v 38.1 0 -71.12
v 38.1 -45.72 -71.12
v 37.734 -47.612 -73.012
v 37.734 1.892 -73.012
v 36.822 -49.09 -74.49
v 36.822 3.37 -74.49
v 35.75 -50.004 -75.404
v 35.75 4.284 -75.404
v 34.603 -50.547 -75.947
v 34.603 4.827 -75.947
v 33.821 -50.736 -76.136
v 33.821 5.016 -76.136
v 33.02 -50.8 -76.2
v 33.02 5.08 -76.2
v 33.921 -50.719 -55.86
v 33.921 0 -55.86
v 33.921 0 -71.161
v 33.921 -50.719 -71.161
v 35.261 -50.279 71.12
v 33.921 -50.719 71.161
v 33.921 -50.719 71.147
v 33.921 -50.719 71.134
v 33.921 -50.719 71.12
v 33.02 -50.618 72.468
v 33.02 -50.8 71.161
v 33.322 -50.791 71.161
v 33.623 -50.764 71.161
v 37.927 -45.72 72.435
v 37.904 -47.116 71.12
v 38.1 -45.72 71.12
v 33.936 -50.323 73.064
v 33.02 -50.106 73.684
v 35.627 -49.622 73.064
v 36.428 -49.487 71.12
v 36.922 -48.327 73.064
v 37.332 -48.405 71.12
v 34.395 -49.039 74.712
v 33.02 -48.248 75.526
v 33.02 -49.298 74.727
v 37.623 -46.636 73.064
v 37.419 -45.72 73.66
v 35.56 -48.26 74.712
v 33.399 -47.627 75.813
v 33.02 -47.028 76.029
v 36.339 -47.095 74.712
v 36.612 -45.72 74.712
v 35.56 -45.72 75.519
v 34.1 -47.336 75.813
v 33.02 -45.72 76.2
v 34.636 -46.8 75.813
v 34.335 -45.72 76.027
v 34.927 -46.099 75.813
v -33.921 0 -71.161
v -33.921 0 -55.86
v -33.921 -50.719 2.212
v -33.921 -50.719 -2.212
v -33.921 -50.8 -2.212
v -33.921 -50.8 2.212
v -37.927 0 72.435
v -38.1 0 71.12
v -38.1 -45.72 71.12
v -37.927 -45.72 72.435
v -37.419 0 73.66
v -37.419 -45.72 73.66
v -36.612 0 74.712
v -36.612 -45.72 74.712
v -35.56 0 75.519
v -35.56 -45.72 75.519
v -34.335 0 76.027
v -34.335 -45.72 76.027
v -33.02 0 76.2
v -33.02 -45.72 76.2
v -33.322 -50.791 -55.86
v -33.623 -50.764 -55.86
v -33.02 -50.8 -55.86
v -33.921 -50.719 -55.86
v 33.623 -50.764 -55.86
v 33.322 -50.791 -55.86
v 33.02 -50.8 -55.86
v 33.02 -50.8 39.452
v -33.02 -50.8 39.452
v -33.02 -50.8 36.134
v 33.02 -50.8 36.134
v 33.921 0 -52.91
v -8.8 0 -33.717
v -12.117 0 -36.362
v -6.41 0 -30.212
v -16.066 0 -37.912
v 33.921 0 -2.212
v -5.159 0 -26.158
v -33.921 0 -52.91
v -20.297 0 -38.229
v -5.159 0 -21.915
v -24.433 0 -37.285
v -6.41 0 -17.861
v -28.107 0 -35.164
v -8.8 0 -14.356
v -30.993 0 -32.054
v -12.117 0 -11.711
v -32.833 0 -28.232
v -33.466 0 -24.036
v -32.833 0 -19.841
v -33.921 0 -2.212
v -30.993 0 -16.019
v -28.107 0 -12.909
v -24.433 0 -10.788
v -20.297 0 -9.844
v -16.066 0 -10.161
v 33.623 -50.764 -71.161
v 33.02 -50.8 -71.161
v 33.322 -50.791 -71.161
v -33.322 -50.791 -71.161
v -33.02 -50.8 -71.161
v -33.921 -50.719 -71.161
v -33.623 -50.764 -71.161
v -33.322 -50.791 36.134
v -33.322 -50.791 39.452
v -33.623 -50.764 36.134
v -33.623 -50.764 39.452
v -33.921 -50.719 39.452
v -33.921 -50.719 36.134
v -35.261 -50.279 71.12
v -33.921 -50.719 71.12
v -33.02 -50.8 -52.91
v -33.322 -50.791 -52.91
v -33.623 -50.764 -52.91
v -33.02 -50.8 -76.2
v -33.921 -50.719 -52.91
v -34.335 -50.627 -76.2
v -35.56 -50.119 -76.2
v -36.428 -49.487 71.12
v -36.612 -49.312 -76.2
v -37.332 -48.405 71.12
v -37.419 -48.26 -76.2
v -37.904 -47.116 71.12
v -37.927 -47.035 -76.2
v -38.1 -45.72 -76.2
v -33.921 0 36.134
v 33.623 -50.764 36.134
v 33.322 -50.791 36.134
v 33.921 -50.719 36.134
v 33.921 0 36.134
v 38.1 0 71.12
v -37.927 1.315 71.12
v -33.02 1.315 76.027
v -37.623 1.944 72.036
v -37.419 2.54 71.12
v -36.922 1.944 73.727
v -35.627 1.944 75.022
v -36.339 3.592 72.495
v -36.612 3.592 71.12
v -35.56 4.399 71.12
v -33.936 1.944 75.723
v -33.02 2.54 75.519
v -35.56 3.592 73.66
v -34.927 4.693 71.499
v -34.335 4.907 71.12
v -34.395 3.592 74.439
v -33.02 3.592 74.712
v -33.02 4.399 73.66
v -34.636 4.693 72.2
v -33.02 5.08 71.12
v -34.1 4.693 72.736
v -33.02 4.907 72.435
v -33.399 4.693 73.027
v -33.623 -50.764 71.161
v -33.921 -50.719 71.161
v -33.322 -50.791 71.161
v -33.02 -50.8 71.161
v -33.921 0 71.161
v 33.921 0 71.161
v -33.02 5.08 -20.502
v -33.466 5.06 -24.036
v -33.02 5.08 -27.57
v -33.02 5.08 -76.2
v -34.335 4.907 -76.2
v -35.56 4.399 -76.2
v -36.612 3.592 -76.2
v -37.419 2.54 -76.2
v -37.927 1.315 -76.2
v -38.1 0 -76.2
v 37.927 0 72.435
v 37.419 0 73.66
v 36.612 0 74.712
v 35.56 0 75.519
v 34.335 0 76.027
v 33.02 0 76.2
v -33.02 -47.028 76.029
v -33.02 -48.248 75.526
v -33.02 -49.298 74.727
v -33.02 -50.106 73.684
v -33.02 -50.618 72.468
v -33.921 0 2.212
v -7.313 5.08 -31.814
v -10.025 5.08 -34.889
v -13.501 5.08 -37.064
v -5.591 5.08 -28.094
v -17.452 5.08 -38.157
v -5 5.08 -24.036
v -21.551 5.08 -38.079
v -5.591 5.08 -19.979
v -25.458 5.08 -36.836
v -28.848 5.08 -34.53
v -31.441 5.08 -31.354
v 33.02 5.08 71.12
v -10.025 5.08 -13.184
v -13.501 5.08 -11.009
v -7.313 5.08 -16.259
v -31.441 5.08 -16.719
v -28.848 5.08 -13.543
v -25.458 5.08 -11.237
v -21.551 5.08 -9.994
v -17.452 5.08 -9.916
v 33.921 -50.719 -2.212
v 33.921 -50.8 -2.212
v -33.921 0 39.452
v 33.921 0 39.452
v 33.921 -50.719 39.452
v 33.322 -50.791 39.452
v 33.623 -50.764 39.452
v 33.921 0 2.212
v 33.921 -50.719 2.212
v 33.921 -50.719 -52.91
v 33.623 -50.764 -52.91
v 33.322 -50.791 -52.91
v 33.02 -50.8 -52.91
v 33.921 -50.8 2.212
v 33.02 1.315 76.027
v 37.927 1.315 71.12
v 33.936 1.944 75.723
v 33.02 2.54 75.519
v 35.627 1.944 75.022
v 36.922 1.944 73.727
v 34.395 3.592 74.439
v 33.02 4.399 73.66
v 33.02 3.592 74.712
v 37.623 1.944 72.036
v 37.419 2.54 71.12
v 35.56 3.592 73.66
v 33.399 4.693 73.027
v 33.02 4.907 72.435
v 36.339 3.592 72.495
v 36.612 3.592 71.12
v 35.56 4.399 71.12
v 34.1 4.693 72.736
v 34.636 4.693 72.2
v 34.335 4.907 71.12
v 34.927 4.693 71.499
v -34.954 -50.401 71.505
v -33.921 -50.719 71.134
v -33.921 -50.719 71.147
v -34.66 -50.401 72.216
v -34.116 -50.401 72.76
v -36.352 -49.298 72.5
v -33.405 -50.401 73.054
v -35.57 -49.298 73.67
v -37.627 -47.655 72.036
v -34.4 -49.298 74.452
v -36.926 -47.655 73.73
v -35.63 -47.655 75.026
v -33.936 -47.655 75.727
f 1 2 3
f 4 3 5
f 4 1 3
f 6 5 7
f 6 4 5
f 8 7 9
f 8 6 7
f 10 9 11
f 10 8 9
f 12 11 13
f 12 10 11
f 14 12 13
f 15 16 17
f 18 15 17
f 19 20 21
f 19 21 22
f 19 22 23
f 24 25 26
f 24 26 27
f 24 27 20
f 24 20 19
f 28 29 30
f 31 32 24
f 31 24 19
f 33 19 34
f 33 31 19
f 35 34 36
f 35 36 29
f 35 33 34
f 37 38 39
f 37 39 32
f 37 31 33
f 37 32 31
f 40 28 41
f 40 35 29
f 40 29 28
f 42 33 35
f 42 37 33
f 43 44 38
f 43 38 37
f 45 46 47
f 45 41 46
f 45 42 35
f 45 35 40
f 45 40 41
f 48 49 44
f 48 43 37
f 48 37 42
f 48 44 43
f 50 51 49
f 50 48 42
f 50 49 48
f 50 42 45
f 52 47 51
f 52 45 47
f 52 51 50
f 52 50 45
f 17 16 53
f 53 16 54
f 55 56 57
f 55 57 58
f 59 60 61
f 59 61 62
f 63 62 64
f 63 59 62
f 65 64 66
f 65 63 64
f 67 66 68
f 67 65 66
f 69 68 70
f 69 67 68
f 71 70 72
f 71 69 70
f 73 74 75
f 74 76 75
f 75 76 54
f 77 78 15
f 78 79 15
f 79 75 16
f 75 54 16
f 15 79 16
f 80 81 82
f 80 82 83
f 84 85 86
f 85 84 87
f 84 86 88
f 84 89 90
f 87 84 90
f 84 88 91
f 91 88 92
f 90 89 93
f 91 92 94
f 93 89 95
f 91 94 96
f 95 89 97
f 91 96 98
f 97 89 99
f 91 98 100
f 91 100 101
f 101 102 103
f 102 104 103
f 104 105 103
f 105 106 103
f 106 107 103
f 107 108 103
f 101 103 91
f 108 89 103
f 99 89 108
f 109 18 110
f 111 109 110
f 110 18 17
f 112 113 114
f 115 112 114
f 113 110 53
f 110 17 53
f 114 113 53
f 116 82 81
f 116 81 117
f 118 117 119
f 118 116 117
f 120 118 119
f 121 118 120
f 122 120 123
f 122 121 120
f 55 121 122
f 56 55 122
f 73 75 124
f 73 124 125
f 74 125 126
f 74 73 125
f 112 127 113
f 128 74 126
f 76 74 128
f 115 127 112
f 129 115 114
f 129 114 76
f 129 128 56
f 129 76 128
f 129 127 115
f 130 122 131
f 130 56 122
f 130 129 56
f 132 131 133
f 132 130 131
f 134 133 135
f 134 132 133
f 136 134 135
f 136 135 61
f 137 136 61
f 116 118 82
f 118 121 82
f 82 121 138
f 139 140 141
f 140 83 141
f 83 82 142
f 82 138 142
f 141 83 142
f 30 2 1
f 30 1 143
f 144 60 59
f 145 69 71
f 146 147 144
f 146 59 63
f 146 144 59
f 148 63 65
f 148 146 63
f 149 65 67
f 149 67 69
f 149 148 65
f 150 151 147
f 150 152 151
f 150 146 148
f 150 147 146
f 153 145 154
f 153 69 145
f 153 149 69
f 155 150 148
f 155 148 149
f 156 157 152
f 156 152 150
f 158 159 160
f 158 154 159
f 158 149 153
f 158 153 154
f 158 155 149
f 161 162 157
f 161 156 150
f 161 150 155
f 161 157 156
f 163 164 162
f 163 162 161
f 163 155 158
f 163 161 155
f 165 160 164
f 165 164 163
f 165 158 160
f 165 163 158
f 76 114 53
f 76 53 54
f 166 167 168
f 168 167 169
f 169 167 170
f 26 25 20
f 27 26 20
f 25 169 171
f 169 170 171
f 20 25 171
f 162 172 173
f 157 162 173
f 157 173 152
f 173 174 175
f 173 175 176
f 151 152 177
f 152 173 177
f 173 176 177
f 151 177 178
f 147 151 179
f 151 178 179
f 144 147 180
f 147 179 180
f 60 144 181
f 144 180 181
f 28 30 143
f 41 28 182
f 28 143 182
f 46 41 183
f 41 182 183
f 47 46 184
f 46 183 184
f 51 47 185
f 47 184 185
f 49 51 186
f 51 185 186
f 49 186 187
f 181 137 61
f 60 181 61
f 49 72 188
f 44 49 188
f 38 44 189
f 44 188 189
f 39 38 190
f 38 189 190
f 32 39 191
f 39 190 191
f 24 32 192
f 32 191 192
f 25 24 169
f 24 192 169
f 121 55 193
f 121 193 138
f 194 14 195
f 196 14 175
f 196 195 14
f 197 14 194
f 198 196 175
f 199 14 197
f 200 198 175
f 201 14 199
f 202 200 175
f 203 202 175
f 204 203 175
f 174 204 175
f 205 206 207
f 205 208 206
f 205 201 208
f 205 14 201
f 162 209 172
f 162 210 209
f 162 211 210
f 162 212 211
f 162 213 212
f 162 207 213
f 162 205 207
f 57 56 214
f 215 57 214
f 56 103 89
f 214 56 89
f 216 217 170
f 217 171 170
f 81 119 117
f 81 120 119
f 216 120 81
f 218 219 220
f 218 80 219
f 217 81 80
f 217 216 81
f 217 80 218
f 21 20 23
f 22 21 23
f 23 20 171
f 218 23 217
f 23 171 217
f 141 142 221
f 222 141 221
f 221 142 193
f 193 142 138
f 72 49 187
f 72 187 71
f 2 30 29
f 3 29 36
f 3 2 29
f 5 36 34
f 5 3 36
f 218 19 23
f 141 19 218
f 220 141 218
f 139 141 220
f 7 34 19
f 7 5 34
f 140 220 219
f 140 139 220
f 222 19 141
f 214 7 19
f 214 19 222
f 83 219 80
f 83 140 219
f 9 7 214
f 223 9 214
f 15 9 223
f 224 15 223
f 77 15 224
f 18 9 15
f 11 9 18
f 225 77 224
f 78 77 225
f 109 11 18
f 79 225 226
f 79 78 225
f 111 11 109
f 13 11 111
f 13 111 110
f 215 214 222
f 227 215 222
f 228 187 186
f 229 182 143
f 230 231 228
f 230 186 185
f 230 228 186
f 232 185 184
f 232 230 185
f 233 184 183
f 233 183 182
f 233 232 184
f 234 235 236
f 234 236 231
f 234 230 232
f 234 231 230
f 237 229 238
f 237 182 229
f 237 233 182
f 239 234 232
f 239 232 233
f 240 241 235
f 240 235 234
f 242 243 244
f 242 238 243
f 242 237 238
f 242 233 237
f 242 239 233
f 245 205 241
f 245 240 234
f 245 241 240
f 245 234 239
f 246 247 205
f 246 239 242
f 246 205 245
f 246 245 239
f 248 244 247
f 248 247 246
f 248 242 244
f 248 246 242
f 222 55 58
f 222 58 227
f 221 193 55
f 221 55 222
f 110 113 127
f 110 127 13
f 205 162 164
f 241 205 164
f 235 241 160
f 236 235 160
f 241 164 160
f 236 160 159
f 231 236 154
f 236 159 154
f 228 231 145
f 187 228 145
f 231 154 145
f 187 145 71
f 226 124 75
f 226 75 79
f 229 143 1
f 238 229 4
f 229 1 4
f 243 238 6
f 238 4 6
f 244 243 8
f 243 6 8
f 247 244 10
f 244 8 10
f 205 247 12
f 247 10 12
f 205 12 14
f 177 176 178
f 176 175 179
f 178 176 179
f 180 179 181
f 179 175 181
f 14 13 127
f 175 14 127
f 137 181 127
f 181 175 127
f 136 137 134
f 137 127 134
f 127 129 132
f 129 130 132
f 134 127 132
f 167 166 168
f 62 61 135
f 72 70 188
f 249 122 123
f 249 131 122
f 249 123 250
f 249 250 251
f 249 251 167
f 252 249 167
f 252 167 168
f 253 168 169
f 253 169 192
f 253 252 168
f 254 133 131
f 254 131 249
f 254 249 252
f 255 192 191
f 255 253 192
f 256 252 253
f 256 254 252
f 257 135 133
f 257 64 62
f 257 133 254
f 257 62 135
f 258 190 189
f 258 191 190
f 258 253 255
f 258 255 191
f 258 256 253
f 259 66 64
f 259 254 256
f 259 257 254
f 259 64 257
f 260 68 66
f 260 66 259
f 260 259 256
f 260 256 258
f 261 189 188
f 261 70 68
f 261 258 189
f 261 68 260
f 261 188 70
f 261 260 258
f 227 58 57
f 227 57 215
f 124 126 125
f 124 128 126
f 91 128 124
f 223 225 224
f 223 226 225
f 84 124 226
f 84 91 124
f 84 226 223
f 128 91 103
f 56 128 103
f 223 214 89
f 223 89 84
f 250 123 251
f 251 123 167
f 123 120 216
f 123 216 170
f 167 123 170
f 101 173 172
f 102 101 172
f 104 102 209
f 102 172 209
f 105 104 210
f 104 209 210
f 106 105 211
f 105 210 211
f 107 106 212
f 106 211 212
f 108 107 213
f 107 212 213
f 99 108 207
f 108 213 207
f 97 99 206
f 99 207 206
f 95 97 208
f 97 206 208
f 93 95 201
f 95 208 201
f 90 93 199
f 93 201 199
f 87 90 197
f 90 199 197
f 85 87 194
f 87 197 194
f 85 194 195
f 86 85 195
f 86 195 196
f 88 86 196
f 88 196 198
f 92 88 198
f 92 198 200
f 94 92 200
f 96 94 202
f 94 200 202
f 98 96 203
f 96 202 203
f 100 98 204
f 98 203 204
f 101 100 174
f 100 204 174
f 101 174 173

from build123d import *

# Parameters (mm, degrees)
F0_W         = 76.2
F0_H         = 152.4
F0_W_2       = 67.8425729275
F0_H_2       = 3.318388015
F0_H_3       = 2.9496736825
F1_DEPTH     = 50.8
F2_W         = 76.2
F2_H         = 152.4
F2_W_2       = 67.8425729275
F2_H_2       = 15.301451087
F2_H_3       = 89.0433862805
F2_H_4       = 31.7090302706
F3_DEPTH     = 5.08
F4_T1_DEPTH  = 81.28
F4_T3_DEPTH  = 177.8
F5_T1_DEPTH  = 66.04
F5_S5_W      = 5.08
F5_S5_H      = 5.08
F5_T6_DEPTH  = 5.08
F5_S11_W     = 5.08
F5_S11_H     = 5.08
F5_T12_DEPTH = 5.08
F6_T1_DEPTH  = 160.02
F6_T3_DEPTH  = 66.04
F6_S7_W      = 5.08
F6_S7_H      = 5.08
F6_T8_DEPTH  = 5.08
F6_T12_ANGLE = 89.9999999979
F7_W         = 67.8425729275
F7_H         = 4.4245161116
F8_DEPTH     = 50.8
F9_R         = 14.2326914524
F10_DEPTH    = 25.4


# Not quite as in the source:
# - a fillet or chamfer that OpenCascade refuses, or shapes differently, is made with other operations: its cross-section is extruded or revolved along the edge and cut away or added


with BuildPart() as f1:
    # F0 (on Front) → F1 (new body)
    with BuildSketch(Plane.XZ):
        Rectangle(F0_W, F0_H)
        Polygon((-33.9212864637, 71.1609646678), (33.9212864637, 71.1609646678), (33.9212864637, 39.4519343972), (33.9212864637, 36.1335463822), (33.9212864637, -52.9098398983), (33.9212864637, -55.8595135808), (33.9212864637, -71.1609646678), (-33.9212864637, -71.1609646678), (-33.9212864637, -55.8595135808), (-33.9212864637, -52.9098398983), (-33.9212864637, 36.1335463822), (-33.9212864637, 39.4519343972), align=None, mode=Mode.SUBTRACT)
        with Locations((0, 37.7927403897)):
            Rectangle(F0_W_2, F0_H_2)
        with Locations((0, -54.3846767396)):
            Rectangle(F0_W_2, F0_H_3)
    extrude(amount=F1_DEPTH)

    # F2 (on face) → F3 (join)
    with BuildSketch(Plane(origin=(0, 0, 0), x_dir=(-1, 0, 0), z_dir=(0, 1, 0))):
        Rectangle(F2_W, F2_H)
        with Locations((0, -63.5102391243)):
            Rectangle(F2_W_2, F2_H_2, mode=Mode.SUBTRACT)
        with Locations((0, -8.3881467581)):
            Rectangle(F2_W_2, F2_H_3, mode=Mode.SUBTRACT)
        with Locations((0, 55.3064495325)):
            Rectangle(F2_W_2, F2_H_4, mode=Mode.SUBTRACT)
        with Locations((0, 55.3064495325)):
            Rectangle(F2_W_2, F2_H_4)
        with Locations((0, -63.5102391243)):
            Rectangle(F2_W_2, F2_H_2)
        with Locations((0, -8.3881467581)):
            Rectangle(F2_W_2, F2_H_3)
    extrude(amount=F3_DEPTH)

    # F4: fillet of radius 5.08 on 6 edges, made by hand

    # F4_s2 → F4_t1 (cut)
    with BuildSketch(Plane.XZ.offset(-17.78)):
        with BuildLine():
            ThreePointArc((38.1, -71.12), (36.6121024484, -74.7121024484), (33.02, -76.2))
            Line((33.02, -76.2), (38.1, -76.2))
            Line((38.1, -76.2), (38.1, -71.12))
        make_face()
        with BuildLine():
            ThreePointArc((38.1, 71.12), (36.6121024484, 74.7121024484), (33.02, 76.2))
            Line((33.02, 76.2), (38.1, 76.2))
            Line((38.1, 76.2), (38.1, 71.12))
        make_face()
        with BuildLine():
            ThreePointArc((-38.1, 71.12), (-36.6121024484, 74.7121024484), (-33.02, 76.2))
            Line((-33.02, 76.2), (-38.1, 76.2))
            Line((-38.1, 76.2), (-38.1, 71.12))
        make_face()
    extrude(amount=F4_T1_DEPTH, mode=Mode.SUBTRACT)

    # F4_s4 → F4_t3 (cut)
    with BuildSketch(Plane.XY.offset(-88.9)):
        with BuildLine():
            ThreePointArc((38.1, -45.72), (36.6121024484, -49.3121024484), (33.02, -50.8))
            Line((33.02, -50.8), (38.1, -50.8))
            Line((38.1, -50.8), (38.1, -45.72))
        make_face()
        with BuildLine():
            ThreePointArc((38.1, 0), (36.6121024484, 3.5921024484), (33.02, 5.08))
            Line((33.02, 5.08), (38.1, 5.08))
            Line((38.1, 5.08), (38.1, 0))
        make_face()
        with BuildLine():
            ThreePointArc((-33.02, 5.08), (-36.6121024484, 3.5921024484), (-38.1, 0))
            Line((-38.1, 0), (-38.1, 5.08))
            Line((-38.1, 5.08), (-33.02, 5.08))
        make_face()
    extrude(amount=F4_T3_DEPTH, mode=Mode.SUBTRACT)

    # F5: fillet of radius 5.08 on 1 edges, made by hand

    # F5_s2 → F5_t1 (cut)
    with BuildSketch(Plane.YZ.offset(-33.02)):
        with BuildLine():
            ThreePointArc((5.08, 71.12), (3.5921024484, 74.7121024484), (0, 76.2))
            Line((0, 76.2), (5.08, 76.2))
            Line((5.08, 76.2), (5.08, 71.12))
        make_face()
    extrude(amount=F5_T1_DEPTH, mode=Mode.SUBTRACT)


with BuildPart() as f5_tool4:
    # F5_s5 → F5_t6 (new body)
    with BuildSketch(Plane.XZ):
        with Locations((-35.56, 73.66)):
            Rectangle(F5_S5_W, F5_S5_H)
    extrude(amount=-F5_T6_DEPTH)

    # F5_s7 → F5_t8 (revolve, cut)
    with BuildSketch(Plane(origin=(-33.02, 0, 71.12), x_dir=(0.7071067812, 0, -0.7071067812), z_dir=(0.7071067812, 0, 0.7071067812))):
        with BuildLine():
            ThreePointArc((0, -5.08), (5.08, 0), (0, 5.08))
            Line((0, 5.08), (0, -5.08))
        make_face()
    revolve(axis=Axis((-33.02, 0, 71.12), (0, 1, 0)), mode=Mode.SUBTRACT)


with BuildPart() as f1_1:
    add(f1.part)

    # F5_t3: cut F5_tool4
    add(f5_tool4.part, mode=Mode.SUBTRACT)


with BuildPart() as f5_tool10:
    # F5_s11 → F5_t12 (new body)
    with BuildSketch(Plane.XZ):
        with Locations((35.56, 73.66)):
            Rectangle(F5_S11_W, F5_S11_H)
    extrude(amount=-F5_T12_DEPTH)

    # F5_s13 → F5_t14 (revolve, cut)
    with BuildSketch(Plane(origin=(33.02, 0, 71.12), x_dir=(-0.7071067812, 0, -0.7071067812), z_dir=(0.7071067812, 0, -0.7071067812))):
        with BuildLine():
            ThreePointArc((0, -5.08), (5.08, 0), (0, 5.08))
            Line((0, 5.08), (0, -5.08))
        make_face()
    revolve(axis=Axis((33.02, 0, 71.12), (0, 1, 0)), mode=Mode.SUBTRACT)


with BuildPart() as f1_2:
    add(f1_1.part)

    # F5_t9: cut F5_tool10
    add(f5_tool10.part, mode=Mode.SUBTRACT)

    # F6: fillet of radius 5.08 on 1 edges, made by hand

    # F6_s2 → F6_t1 (cut)
    with BuildSketch(Plane.XY.offset(-88.9)):
        with BuildLine():
            ThreePointArc((-33.02, -50.8), (-36.6121024484, -49.3121024484), (-38.1, -45.72))
            Line((-38.1, -45.72), (-38.1, -50.8))
            Line((-38.1, -50.8), (-33.02, -50.8))
        make_face()
    extrude(amount=F6_T1_DEPTH, mode=Mode.SUBTRACT)

    # F6_s4 → F6_t3 (cut)
    with BuildSketch(Plane.YZ.offset(-33.02)):
        with BuildLine():
            ThreePointArc((-45.72, 76.2), (-49.3121024484, 74.7121024484), (-50.8, 71.12))
            Line((-50.8, 71.12), (-50.8, 76.2))
            Line((-50.8, 76.2), (-45.72, 76.2))
        make_face()
    extrude(amount=F6_T3_DEPTH, mode=Mode.SUBTRACT)


with BuildPart() as f6_tool6:
    # F6_s7 → F6_t8 (new body)
    with BuildSketch(Plane.XY.offset(71.12)):
        with Locations((35.56, -48.26)):
            Rectangle(F6_S7_W, F6_S7_H)
    extrude(amount=F6_T8_DEPTH)

    # F6_s9 → F6_t10 (revolve, cut)
    with BuildSketch(Plane(origin=(33.02, -45.72, 71.12), x_dir=(-0.7071067812, 0.7071067812, 0), z_dir=(0.7071067812, 0.7071067812, 0))):
        with BuildLine():
            ThreePointArc((0, -5.08), (5.08, 0), (0, 5.08))
            Line((0, 5.08), (0, -5.08))
        make_face()
    revolve(axis=Axis((33.02, -45.72, 71.12), (0, 0, 1)), mode=Mode.SUBTRACT)


with BuildPart() as f1_3:
    add(f1_2.part)

    # F6_t5: cut F6_tool6
    add(f6_tool6.part, mode=Mode.SUBTRACT)

    # F6_s11 → F6_t12 (revolve, cut)
    with BuildSketch(Plane.XY.offset(71.1199999999)):
        with BuildLine():
            ThreePointArc((-33.02, -50.8), (-36.6121024484, -49.3121024484), (-38.1, -45.72))
            Line((-38.1, -45.72), (-38.1, -50.8))
            Line((-38.1, -50.8), (-33.02, -50.8))
        make_face()
    revolve(axis=Axis((-33.0199999999, -50.8, 71.1199999999), (0, 1, 0)), revolution_arc=F6_T12_ANGLE, mode=Mode.SUBTRACT)

    # F7 (on face) → F8 (join)
    with BuildSketch(Plane.XZ):
        Rectangle(F7_W, F7_H)
    extrude(amount=F8_DEPTH)

    # F9 (on face) → F10 (cut)
    with BuildSketch(Plane(origin=(0, 5.08, 0), x_dir=(-1, 0, 0), z_dir=(0, 1, 0))):
        with Locations((19.2330349237, -24.0364484489)):
            Circle(F9_R)
    extrude(amount=-F10_DEPTH, mode=Mode.SUBTRACT)


solid = f1_3.part
